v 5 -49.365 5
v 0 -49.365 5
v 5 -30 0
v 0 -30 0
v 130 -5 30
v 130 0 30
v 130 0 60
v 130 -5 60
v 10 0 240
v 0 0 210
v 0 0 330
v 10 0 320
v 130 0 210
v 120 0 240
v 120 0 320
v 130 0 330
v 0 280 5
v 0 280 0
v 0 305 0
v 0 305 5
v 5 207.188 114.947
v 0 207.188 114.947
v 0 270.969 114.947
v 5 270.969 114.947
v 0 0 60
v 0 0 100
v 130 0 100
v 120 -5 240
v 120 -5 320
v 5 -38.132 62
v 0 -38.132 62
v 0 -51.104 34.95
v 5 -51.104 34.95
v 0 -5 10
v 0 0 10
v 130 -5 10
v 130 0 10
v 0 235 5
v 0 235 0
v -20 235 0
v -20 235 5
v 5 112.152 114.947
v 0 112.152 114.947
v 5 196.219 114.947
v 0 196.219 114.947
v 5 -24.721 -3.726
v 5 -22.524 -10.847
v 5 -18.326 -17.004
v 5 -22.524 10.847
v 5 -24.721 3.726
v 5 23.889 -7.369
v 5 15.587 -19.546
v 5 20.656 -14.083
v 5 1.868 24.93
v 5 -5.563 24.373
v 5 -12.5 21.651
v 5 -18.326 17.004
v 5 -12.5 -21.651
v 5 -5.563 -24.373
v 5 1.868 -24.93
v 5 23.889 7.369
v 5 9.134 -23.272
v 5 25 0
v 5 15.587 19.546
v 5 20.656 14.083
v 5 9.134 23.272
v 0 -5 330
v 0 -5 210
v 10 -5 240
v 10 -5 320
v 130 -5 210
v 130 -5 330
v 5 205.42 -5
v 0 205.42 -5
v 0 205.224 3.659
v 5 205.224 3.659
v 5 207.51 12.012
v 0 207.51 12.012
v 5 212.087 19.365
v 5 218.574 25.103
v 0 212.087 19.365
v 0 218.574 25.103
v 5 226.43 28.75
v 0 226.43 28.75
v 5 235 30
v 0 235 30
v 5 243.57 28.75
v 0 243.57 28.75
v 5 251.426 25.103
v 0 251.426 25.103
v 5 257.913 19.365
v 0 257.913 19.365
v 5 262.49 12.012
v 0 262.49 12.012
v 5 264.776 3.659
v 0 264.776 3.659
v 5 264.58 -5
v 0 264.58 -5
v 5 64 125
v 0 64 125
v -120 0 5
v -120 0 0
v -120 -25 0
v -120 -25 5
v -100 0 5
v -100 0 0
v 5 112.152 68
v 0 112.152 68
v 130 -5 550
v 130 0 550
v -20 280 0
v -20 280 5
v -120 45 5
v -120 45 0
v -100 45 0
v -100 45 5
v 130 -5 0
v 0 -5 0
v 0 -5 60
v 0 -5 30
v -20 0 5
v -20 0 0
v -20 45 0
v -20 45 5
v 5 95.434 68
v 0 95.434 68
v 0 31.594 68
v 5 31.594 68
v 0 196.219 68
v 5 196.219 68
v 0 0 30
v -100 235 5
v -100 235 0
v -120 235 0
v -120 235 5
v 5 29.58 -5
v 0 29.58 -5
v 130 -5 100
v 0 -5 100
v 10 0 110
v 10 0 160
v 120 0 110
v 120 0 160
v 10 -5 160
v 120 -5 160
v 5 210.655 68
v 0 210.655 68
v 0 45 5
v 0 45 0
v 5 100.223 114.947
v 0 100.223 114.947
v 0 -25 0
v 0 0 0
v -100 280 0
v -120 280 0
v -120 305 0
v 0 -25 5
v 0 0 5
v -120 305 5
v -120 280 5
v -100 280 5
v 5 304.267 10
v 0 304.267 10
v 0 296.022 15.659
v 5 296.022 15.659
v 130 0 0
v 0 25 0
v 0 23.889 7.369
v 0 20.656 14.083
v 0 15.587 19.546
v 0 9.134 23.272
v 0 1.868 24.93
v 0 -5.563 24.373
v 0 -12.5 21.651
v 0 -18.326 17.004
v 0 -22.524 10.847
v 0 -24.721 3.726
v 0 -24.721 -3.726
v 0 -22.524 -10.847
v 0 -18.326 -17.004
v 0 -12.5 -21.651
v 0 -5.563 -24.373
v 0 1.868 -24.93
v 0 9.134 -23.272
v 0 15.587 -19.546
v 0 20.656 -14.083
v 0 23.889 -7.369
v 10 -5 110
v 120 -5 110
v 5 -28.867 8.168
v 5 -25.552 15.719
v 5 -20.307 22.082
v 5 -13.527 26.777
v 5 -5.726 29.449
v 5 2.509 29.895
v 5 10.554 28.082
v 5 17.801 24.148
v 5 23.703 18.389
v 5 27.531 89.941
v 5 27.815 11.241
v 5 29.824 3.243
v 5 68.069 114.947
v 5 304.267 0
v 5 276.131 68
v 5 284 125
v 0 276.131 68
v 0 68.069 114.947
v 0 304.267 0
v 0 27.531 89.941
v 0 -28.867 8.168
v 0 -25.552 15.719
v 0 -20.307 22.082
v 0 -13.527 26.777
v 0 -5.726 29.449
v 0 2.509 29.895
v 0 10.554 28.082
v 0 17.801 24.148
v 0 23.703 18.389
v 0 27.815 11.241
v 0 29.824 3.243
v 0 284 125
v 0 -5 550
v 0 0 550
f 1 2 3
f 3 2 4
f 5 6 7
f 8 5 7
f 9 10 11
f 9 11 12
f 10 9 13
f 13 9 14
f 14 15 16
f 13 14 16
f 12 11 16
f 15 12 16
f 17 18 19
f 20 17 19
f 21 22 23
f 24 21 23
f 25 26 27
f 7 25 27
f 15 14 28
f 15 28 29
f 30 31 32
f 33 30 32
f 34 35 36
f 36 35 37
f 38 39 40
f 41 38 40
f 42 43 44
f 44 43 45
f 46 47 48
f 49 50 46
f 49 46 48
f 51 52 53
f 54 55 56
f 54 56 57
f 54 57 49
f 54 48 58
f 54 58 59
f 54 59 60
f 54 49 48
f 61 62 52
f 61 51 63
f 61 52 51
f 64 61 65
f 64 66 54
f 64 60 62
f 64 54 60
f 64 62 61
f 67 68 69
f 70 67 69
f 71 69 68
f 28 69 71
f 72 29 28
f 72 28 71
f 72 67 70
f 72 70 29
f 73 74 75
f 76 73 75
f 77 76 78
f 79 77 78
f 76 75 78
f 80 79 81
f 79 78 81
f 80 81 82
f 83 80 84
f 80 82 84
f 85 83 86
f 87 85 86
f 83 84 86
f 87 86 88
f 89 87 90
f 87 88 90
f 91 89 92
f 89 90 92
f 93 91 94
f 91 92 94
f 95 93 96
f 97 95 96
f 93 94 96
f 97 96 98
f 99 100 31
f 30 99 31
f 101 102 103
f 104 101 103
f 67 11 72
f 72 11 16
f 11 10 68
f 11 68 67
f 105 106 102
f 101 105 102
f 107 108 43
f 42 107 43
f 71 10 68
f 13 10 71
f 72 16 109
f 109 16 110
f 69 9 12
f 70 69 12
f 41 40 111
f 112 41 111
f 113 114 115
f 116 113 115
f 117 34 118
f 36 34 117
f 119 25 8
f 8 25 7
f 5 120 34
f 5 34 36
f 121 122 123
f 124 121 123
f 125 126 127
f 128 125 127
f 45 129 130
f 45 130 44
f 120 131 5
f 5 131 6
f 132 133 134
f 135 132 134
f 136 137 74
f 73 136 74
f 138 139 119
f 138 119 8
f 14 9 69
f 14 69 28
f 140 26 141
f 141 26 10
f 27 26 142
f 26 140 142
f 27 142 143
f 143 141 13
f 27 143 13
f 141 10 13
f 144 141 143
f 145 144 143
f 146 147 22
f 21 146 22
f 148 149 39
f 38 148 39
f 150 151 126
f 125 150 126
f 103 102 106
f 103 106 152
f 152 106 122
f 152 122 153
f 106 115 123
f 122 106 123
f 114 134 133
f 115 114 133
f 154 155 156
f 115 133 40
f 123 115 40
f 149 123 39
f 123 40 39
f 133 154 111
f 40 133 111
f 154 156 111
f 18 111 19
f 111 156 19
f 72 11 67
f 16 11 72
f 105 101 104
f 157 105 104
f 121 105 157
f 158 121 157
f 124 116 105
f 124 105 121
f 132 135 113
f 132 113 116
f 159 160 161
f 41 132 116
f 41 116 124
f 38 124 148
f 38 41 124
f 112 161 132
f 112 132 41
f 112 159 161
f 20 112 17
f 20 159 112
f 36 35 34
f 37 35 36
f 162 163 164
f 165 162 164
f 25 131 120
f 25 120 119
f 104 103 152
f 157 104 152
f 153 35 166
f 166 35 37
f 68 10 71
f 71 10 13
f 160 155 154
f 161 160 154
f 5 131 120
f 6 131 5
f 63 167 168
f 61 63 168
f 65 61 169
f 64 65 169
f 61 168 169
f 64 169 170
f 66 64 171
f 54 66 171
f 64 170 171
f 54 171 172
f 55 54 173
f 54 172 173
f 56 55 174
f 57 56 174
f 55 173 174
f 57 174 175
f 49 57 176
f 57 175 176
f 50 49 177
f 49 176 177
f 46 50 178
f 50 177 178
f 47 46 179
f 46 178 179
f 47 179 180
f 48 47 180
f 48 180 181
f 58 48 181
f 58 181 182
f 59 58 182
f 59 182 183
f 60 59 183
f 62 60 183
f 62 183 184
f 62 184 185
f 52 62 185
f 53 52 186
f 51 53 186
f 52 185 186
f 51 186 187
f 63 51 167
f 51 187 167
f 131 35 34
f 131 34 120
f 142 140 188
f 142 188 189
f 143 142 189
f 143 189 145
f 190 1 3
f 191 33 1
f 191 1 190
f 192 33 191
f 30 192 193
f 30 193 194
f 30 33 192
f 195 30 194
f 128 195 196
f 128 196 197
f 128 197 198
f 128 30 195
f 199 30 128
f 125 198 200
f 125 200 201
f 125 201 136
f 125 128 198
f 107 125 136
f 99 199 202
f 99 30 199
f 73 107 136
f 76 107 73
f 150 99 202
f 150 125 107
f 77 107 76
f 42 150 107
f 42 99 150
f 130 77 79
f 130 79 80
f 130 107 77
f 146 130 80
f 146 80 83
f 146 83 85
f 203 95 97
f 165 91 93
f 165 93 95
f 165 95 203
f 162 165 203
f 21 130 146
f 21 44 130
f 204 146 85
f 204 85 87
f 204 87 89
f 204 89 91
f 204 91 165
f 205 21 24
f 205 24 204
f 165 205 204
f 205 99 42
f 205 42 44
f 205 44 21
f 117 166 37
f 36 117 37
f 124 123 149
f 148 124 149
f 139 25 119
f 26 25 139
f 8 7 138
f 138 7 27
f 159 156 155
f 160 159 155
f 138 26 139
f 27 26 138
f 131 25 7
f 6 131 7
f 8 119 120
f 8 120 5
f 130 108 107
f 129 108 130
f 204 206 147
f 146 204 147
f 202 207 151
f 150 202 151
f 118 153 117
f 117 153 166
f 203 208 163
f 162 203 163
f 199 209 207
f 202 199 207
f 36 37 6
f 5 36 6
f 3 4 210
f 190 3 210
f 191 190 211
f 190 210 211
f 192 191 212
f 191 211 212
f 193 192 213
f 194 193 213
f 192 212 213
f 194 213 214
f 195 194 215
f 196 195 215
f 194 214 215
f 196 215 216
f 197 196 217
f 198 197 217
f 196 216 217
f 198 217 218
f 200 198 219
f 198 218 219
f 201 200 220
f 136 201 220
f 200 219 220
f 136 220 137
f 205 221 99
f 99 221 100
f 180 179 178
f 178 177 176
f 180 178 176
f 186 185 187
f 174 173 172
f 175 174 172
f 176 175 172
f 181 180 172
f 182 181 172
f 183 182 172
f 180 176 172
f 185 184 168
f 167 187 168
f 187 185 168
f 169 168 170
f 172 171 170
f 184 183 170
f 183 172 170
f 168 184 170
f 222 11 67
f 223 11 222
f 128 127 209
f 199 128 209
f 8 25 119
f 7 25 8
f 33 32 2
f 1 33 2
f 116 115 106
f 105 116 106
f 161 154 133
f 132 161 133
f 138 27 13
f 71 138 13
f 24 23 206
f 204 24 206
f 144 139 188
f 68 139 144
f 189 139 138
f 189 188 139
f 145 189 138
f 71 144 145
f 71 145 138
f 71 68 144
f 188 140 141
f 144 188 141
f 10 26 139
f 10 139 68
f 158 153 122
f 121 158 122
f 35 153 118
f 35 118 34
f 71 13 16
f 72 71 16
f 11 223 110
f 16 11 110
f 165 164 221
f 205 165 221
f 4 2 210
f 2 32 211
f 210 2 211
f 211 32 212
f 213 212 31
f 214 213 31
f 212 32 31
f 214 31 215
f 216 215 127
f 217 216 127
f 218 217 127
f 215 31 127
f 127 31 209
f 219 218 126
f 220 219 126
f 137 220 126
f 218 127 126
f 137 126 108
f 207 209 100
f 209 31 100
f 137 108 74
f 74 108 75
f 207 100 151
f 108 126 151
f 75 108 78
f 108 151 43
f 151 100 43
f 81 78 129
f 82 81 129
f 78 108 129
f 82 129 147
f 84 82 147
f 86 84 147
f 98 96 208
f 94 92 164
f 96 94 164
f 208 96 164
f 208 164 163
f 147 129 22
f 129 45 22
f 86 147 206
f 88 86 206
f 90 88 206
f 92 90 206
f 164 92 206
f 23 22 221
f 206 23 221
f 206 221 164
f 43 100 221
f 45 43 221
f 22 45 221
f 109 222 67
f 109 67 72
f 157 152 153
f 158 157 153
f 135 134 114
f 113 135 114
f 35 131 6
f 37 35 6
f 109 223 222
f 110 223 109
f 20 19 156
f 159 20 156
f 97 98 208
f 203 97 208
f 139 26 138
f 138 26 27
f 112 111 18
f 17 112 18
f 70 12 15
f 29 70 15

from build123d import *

# Parameters (mm, degrees)
F0_R      = 25
F0_W      = 84.067106
F0_H      = 46.947088
F1_DEPTH  = 5
F3_DEPTH  = 5
F4_W      = 130
F4_H      = 220
F5_DEPTH  = 5
F4_H_2    = 120
F4_W_2    = 110
F4_H_3    = 80
F6_DEPTH  = 5
F4_H_4    = 110
F4_H_5    = 50
F7_DEPTH  = 5
F4_H_6    = 40
F8_DEPTH  = 5
F4_H_7    = 30
F9_DEPTH  = 5
F4_H_8    = 20
F10_DEPTH = 5
F4_H_9    = 10
F11_DEPTH = 5


with BuildPart() as f1:
    # F0 (on Right) → F1 (new body)
    with BuildSketch(Plane.YZ):
        Circle(F0_R)
        with BuildLine():
            ThreePointArc((-30, 0), (2.508788, 29.894916), (29.580399, -5))
            Line((29.580399, -5), (205.419601, -5))
            ThreePointArc((205.419601, -5), (235, 30), (264.580399, -5))
            Line((264.580399, -5), (304.266669, 0))
            Line((304.266669, 0), (304.266669, 10))
            Line((304.266669, 10), (296.021865, 15.658906))
            Line((296.021865, 15.658906), (284, 125))
            Line((284, 125), (64, 125))
            Line((64, 125), (-38.132267, 62))
            Line((-38.132267, 62), (-51.104252, 34.949536))
            Line((-51.104252, 34.949536), (-49.364917, 5))
            Line((-49.364917, 5), (-30, 0))
        make_face()
        Polygon((95.434301, 68), (31.59388, 68), (27.530611, 89.941205), (68.068825, 114.947088), (100.222918, 114.947088), align=None, mode=Mode.SUBTRACT)
        with Locations((154.185772, 91.473544)):
            Rectangle(F0_W, F0_H, mode=Mode.SUBTRACT)
        Polygon((270.96907, 114.947088), (276.130822, 68), (210.655245, 68), (207.187737, 114.947088), align=None, mode=Mode.SUBTRACT)
    extrude(amount=F1_DEPTH)


with BuildPart() as f3:
    # F2 (on Top) → F3 (new body)
    with BuildSketch(Plane.XY):
        Polygon((-100, 235), (-120, 235), (-120, 45), (-100, 45), (-100, 0), (-120, 0), (-120, -25), (0, -25), (0, 0), (-20, 0), (-20, 45), (0, 45), (0, 235), (-20, 235), (-20, 280), (0, 280), (0, 305), (-120, 305), (-120, 280), (-100, 280), align=None)
    extrude(amount=F3_DEPTH)


with BuildPart() as f5:
    # F4 (on Front) → F5 (new body)
    with BuildSketch(Plane.XZ):
        with Locations((65, 440)):
            Rectangle(F4_W, F4_H)
    extrude(amount=F5_DEPTH)


with BuildPart() as f6:
    # F4 (on Front) → F6 (new body)
    with BuildSketch(Plane.XZ):
        with Locations((65, 270)):
            Rectangle(F4_W, F4_H_2)
        with Locations((65, 280)):
            Rectangle(F4_W_2, F4_H_3, mode=Mode.SUBTRACT)
    extrude(amount=F6_DEPTH)


with BuildPart() as f7:
    # F4 (on Front) → F7 (new body)
    with BuildSketch(Plane.XZ):
        with Locations((65, 155)):
            Rectangle(F4_W, F4_H_4)
        with Locations((65, 135)):
            Rectangle(F4_W_2, F4_H_5, mode=Mode.SUBTRACT)
    extrude(amount=F7_DEPTH)


with BuildPart() as f8:
    # F4 (on Front) → F8 (new body)
    with BuildSketch(Plane.XZ):
        with Locations((65, 80)):
            Rectangle(F4_W, F4_H_6)
    extrude(amount=F8_DEPTH)


with BuildPart() as f9:
    # F4 (on Front) → F9 (new body)
    with BuildSketch(Plane.XZ):
        with Locations((65, 45)):
            Rectangle(F4_W, F4_H_7)
    extrude(amount=F9_DEPTH)


with BuildPart() as f10:
    # F4 (on Front) → F10 (new body)
    with BuildSketch(Plane.XZ):
        with Locations((65, 20)):
            Rectangle(F4_W, F4_H_8)
    extrude(amount=F10_DEPTH)


with BuildPart() as f11:
    # F4 (on Front) → F11 (new body)
    with BuildSketch(Plane.XZ):
        with Locations((65, 5)):
            Rectangle(F4_W, F4_H_9)
    extrude(amount=F11_DEPTH)


solid = Compound([f1.part, f3.part, f5.part, f6.part, f7.part, f8.part, f9.part, f10.part, f11.part])
